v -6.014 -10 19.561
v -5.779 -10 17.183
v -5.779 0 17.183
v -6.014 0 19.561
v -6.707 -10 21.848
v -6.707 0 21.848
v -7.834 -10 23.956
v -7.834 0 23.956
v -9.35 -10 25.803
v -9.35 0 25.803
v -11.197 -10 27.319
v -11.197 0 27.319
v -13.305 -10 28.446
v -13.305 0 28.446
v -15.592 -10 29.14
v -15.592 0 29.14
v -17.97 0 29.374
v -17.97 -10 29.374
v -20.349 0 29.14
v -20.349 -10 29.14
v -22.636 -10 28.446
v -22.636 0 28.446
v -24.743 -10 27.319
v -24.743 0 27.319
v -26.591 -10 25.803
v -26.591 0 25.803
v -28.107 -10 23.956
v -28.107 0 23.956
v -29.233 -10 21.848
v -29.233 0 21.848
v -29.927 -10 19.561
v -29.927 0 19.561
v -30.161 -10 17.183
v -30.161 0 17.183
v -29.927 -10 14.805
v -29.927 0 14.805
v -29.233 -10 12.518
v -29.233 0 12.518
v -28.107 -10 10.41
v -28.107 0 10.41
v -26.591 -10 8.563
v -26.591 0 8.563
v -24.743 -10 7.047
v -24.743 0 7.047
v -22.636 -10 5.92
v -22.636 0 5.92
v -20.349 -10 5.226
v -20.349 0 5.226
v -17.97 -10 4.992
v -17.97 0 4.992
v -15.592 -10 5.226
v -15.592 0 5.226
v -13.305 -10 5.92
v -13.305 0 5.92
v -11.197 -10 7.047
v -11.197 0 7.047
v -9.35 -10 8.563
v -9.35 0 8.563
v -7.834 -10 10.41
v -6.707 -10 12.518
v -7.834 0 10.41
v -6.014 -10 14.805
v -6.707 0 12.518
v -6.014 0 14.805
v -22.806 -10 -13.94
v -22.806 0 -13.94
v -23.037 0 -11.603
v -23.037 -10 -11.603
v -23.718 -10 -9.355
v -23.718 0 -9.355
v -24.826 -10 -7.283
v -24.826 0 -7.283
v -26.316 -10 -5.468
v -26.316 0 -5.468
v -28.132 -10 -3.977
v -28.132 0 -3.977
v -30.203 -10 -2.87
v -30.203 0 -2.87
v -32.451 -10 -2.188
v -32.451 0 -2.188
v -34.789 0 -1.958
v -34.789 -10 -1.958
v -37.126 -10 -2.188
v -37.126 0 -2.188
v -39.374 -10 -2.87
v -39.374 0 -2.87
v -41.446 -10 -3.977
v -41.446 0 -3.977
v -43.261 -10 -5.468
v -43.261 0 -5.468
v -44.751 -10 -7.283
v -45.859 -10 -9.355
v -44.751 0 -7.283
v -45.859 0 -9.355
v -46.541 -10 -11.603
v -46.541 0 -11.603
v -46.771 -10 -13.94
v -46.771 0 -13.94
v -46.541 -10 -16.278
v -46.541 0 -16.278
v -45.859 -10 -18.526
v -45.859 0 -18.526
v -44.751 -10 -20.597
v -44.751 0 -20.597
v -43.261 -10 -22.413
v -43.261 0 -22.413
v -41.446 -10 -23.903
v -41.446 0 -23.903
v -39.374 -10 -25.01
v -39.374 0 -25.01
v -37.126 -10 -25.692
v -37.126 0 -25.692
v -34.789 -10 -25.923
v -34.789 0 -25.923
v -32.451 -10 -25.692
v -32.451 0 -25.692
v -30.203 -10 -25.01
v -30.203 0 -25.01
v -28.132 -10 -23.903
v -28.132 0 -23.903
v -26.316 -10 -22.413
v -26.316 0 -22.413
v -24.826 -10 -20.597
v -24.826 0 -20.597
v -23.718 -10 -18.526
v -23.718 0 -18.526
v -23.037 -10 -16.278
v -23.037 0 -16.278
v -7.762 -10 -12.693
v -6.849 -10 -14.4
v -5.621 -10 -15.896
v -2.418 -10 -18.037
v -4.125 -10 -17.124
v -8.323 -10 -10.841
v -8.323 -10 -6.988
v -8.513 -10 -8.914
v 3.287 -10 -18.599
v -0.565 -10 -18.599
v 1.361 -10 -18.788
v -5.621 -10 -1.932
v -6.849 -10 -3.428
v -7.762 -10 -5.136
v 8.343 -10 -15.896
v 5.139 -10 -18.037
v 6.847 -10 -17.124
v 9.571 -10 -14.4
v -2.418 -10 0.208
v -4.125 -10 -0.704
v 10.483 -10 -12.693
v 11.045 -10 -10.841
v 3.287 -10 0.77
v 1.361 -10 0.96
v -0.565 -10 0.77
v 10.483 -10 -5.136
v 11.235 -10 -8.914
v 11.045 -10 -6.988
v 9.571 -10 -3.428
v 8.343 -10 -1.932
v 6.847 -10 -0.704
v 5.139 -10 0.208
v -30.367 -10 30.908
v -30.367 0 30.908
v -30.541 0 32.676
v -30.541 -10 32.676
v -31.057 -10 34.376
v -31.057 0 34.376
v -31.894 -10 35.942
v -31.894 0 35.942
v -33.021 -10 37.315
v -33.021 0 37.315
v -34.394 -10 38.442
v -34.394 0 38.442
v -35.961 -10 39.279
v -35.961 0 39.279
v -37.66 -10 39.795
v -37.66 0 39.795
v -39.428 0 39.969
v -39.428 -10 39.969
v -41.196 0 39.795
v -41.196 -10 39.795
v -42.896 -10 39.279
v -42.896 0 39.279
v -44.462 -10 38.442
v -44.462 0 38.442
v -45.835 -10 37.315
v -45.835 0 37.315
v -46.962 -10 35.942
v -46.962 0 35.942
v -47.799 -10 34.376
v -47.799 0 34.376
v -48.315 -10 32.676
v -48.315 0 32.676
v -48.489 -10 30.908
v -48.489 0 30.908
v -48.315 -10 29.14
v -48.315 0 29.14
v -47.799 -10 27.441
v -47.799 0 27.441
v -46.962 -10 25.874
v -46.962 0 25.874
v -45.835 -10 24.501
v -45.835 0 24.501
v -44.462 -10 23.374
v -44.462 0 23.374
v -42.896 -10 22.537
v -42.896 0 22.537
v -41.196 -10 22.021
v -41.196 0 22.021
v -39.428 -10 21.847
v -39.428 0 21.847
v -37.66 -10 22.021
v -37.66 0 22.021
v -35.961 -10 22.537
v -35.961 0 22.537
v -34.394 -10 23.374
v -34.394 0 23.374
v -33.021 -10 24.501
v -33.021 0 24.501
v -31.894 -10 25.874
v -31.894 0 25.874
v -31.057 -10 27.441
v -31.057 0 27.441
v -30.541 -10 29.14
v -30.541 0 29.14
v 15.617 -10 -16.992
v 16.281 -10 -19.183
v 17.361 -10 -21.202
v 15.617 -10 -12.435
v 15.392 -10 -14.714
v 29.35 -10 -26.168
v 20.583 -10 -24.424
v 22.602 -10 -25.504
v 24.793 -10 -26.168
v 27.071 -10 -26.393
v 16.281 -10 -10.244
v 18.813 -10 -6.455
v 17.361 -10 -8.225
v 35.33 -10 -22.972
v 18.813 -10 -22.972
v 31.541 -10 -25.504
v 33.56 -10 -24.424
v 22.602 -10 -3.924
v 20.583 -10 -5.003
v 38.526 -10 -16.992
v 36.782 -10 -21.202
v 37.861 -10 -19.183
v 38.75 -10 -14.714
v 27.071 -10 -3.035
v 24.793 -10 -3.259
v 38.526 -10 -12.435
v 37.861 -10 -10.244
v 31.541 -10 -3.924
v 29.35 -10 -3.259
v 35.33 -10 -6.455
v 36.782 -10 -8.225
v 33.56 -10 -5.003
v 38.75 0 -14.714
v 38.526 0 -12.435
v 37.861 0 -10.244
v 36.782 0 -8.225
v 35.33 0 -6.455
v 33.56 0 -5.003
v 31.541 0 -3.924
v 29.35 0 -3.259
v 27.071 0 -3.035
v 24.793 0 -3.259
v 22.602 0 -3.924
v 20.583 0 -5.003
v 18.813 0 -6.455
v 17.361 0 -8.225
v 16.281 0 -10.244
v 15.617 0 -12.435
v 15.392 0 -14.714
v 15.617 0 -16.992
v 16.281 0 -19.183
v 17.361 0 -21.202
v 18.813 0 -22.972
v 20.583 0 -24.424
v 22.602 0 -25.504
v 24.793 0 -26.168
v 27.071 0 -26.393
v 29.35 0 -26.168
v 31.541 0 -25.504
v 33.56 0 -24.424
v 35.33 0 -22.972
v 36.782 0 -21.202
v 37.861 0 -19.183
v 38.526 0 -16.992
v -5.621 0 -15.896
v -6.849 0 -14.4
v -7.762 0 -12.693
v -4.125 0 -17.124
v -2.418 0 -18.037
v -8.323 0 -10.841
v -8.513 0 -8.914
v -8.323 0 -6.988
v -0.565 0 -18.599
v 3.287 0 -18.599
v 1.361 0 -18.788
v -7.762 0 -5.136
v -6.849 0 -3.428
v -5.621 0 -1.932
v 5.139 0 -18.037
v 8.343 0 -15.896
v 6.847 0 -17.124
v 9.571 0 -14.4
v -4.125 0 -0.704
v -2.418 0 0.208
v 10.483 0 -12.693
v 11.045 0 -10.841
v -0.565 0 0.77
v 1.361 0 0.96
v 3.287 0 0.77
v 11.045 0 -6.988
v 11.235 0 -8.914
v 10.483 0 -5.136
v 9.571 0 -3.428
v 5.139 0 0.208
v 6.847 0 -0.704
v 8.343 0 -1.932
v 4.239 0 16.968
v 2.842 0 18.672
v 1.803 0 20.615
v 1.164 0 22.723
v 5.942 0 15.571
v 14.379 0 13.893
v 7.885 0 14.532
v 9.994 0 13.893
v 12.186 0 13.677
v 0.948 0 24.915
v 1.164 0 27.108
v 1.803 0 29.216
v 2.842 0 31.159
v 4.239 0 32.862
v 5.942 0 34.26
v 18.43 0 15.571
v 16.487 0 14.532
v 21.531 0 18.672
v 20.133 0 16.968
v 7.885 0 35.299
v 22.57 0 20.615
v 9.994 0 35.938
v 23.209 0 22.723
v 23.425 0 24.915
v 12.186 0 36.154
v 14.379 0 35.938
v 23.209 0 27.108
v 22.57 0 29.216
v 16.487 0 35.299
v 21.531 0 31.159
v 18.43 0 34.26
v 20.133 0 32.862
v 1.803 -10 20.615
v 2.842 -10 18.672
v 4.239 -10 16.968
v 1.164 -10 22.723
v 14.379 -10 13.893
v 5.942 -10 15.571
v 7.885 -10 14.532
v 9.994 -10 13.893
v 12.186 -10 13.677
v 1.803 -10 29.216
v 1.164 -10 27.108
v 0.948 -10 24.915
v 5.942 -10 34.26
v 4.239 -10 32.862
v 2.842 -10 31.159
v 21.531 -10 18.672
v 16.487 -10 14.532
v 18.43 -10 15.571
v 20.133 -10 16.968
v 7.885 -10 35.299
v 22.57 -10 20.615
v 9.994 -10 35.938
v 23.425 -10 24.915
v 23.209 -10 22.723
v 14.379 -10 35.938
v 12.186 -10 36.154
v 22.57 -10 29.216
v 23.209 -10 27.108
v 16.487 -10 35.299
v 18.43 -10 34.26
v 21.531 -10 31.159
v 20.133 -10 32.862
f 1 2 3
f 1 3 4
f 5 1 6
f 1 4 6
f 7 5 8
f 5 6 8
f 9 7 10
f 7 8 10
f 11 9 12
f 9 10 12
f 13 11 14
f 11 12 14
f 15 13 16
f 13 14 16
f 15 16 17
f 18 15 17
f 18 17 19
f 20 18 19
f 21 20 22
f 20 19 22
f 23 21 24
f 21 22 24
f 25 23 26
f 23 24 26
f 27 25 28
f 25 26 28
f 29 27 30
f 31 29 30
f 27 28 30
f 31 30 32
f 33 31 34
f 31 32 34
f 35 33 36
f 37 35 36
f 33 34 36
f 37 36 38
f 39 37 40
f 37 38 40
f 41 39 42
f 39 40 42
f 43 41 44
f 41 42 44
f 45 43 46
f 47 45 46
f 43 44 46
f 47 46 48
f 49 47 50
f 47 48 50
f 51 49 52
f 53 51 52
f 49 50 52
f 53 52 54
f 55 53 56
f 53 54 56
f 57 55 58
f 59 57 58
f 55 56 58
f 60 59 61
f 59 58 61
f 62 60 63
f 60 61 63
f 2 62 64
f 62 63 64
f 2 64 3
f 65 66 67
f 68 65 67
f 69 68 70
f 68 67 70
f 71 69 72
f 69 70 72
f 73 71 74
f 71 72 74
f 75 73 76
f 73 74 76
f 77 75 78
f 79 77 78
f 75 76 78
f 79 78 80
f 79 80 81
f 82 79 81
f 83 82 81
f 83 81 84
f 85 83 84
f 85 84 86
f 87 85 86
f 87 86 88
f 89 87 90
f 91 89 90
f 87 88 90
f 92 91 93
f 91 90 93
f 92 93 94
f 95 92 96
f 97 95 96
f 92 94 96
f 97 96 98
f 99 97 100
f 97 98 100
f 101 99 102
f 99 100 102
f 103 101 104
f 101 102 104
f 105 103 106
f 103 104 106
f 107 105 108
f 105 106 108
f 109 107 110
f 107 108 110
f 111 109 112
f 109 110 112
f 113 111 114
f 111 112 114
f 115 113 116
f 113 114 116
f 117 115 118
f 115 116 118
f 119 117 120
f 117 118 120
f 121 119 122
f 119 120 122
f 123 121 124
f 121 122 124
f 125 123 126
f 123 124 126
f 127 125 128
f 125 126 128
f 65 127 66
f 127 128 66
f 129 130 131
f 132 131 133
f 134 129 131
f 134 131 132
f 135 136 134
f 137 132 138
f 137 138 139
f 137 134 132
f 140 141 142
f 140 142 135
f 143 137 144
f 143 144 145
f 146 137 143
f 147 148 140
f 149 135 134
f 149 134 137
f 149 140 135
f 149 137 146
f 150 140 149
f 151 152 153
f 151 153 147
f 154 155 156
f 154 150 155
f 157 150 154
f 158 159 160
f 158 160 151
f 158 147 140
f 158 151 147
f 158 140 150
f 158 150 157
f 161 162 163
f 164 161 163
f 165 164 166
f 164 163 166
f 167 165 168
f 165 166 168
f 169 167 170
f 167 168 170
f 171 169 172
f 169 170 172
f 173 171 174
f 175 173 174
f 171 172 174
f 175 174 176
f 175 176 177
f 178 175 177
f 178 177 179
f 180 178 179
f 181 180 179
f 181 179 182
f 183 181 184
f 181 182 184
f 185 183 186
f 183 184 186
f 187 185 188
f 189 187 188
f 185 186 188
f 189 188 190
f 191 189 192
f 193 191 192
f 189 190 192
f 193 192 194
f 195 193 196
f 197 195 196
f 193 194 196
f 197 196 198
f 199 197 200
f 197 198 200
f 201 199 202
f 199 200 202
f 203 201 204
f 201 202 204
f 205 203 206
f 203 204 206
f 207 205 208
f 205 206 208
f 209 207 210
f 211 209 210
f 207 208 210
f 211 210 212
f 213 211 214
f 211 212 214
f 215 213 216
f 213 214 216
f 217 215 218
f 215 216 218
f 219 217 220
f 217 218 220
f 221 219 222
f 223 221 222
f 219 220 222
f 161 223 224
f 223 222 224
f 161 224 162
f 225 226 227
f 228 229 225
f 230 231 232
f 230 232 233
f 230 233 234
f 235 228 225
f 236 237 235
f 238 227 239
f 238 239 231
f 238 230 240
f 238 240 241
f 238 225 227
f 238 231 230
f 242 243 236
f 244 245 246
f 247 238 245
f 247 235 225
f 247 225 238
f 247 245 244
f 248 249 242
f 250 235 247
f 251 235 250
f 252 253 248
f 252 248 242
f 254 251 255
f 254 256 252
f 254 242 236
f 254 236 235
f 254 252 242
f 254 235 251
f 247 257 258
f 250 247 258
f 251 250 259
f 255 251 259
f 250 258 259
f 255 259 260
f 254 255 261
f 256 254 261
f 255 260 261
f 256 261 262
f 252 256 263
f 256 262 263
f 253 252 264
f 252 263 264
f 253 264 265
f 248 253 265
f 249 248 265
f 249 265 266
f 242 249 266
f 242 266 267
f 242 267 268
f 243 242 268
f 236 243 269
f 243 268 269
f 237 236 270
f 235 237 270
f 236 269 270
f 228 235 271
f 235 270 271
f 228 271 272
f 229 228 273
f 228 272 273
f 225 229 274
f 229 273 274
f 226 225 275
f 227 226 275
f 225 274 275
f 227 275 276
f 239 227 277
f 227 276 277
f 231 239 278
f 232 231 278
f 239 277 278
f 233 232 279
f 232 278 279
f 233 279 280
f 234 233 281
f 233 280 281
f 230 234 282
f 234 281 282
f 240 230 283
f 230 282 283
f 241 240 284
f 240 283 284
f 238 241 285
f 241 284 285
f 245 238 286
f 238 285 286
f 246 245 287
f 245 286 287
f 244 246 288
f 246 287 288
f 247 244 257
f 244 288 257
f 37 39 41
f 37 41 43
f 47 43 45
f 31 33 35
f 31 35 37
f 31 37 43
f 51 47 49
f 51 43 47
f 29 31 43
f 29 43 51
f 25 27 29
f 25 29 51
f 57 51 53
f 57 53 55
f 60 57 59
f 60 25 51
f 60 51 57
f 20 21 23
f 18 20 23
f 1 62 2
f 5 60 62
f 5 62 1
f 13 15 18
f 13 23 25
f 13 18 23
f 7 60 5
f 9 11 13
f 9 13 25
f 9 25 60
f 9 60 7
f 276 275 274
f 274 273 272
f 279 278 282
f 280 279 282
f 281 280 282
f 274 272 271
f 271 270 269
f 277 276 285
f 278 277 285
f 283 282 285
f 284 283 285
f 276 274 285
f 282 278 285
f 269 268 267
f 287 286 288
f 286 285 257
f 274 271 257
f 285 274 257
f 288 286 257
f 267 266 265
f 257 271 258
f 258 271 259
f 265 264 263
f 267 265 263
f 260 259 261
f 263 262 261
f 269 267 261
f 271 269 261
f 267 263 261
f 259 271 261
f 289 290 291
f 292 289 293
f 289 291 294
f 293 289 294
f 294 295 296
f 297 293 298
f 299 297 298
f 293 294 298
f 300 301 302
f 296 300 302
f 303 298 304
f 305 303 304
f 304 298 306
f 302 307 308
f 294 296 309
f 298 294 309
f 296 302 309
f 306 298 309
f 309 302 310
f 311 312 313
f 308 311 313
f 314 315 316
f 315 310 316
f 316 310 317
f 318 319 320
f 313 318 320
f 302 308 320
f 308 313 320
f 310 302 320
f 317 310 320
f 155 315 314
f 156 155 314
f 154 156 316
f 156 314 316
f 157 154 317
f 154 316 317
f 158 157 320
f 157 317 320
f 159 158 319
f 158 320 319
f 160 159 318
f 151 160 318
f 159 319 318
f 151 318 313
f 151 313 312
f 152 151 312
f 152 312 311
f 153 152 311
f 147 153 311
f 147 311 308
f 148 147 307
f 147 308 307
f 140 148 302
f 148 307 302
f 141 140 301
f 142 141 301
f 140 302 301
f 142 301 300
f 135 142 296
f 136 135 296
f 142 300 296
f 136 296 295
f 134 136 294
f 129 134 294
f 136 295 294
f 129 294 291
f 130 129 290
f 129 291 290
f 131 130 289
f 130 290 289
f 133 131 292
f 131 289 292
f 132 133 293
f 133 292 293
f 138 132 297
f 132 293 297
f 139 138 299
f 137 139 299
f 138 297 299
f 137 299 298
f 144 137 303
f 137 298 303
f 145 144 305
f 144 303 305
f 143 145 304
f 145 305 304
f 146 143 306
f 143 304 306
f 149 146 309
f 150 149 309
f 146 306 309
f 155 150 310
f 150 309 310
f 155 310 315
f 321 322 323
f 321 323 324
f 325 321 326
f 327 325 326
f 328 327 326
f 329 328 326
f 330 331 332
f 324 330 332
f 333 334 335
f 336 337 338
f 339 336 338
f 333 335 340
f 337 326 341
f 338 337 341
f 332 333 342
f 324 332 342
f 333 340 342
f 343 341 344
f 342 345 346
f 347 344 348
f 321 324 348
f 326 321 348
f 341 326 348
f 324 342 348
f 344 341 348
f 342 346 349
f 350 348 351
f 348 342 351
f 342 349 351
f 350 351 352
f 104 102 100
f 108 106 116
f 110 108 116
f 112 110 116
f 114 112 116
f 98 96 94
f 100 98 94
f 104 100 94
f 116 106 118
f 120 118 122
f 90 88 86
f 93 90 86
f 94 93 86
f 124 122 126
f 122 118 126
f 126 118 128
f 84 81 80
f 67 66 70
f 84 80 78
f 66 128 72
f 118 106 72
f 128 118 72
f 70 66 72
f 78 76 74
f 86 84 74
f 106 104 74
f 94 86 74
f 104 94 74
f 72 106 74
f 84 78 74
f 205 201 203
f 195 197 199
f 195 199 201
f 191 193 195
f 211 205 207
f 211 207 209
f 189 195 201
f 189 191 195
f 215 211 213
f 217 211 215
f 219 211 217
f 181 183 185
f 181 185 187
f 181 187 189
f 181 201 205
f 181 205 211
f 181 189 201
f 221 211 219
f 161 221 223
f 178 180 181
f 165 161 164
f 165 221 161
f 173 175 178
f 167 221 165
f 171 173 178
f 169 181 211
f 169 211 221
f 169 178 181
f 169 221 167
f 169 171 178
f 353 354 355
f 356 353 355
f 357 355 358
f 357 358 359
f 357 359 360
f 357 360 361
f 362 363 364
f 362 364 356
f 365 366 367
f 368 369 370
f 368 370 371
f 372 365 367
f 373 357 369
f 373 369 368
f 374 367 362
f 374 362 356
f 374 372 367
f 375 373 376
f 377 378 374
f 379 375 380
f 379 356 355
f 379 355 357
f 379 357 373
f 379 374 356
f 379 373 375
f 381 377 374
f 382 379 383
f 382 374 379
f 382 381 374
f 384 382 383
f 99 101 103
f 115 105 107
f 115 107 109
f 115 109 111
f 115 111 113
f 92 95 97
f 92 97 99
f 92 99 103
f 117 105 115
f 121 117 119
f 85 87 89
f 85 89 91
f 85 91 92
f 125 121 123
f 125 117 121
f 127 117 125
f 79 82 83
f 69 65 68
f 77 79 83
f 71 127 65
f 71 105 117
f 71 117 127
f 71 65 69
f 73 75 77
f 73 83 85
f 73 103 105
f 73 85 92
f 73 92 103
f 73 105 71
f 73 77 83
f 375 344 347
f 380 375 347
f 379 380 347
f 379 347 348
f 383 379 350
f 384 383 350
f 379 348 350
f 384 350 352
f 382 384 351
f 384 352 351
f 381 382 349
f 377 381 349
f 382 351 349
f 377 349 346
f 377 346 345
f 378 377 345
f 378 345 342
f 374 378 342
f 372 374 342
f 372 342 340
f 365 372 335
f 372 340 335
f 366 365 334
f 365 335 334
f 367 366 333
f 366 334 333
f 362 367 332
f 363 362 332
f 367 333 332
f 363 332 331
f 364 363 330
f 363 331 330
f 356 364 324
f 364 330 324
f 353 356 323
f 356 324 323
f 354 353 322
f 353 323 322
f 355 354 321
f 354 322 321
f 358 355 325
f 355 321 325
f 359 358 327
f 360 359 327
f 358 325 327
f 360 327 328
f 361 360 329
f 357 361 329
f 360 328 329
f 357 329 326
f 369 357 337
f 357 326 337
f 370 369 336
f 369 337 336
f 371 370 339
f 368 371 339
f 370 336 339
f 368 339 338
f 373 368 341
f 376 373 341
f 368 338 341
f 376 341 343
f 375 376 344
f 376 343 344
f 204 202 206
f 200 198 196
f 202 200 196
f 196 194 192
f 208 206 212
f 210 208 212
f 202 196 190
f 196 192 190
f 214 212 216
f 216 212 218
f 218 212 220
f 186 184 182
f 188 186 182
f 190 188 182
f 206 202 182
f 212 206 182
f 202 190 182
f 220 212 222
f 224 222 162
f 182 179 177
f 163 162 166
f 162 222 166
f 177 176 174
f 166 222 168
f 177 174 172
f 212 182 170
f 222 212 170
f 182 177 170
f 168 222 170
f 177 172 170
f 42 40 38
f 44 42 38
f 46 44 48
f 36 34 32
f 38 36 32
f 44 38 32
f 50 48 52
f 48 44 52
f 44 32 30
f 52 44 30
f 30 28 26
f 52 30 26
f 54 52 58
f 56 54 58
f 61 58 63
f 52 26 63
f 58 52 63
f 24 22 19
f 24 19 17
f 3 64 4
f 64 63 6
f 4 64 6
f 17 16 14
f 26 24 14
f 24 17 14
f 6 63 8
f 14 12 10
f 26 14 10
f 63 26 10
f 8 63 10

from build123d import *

# Parameters (mm, degrees)
F0_R     = 9.060957
F0_R_2   = 12.190942
F0_R_3   = 11.238741
F0_R_4   = 11.982241
F0_R_5   = 9.874074
F0_R_6   = 11.679004
F1_DEPTH = 10


with BuildPart() as f1:
    # F0 (on Front) → F1 (new body)
    with BuildSketch(Plane.XZ):
        with Locations((-39.428029, 30.908142)):
            Circle(F0_R)
        with Locations((-17.970371, 17.182969)):
            Circle(F0_R_2)
        with Locations((12.186334, 24.915461)):
            Circle(F0_R_3)
        with Locations((-34.788537, -13.940298)):
            Circle(F0_R_4)
        with Locations((1.360853, -8.91418)):
            Circle(F0_R_5)
        with Locations((27.071376, -14.713548)):
            Circle(F0_R_6)
    extrude(amount=F1_DEPTH)


solid = f1.part
